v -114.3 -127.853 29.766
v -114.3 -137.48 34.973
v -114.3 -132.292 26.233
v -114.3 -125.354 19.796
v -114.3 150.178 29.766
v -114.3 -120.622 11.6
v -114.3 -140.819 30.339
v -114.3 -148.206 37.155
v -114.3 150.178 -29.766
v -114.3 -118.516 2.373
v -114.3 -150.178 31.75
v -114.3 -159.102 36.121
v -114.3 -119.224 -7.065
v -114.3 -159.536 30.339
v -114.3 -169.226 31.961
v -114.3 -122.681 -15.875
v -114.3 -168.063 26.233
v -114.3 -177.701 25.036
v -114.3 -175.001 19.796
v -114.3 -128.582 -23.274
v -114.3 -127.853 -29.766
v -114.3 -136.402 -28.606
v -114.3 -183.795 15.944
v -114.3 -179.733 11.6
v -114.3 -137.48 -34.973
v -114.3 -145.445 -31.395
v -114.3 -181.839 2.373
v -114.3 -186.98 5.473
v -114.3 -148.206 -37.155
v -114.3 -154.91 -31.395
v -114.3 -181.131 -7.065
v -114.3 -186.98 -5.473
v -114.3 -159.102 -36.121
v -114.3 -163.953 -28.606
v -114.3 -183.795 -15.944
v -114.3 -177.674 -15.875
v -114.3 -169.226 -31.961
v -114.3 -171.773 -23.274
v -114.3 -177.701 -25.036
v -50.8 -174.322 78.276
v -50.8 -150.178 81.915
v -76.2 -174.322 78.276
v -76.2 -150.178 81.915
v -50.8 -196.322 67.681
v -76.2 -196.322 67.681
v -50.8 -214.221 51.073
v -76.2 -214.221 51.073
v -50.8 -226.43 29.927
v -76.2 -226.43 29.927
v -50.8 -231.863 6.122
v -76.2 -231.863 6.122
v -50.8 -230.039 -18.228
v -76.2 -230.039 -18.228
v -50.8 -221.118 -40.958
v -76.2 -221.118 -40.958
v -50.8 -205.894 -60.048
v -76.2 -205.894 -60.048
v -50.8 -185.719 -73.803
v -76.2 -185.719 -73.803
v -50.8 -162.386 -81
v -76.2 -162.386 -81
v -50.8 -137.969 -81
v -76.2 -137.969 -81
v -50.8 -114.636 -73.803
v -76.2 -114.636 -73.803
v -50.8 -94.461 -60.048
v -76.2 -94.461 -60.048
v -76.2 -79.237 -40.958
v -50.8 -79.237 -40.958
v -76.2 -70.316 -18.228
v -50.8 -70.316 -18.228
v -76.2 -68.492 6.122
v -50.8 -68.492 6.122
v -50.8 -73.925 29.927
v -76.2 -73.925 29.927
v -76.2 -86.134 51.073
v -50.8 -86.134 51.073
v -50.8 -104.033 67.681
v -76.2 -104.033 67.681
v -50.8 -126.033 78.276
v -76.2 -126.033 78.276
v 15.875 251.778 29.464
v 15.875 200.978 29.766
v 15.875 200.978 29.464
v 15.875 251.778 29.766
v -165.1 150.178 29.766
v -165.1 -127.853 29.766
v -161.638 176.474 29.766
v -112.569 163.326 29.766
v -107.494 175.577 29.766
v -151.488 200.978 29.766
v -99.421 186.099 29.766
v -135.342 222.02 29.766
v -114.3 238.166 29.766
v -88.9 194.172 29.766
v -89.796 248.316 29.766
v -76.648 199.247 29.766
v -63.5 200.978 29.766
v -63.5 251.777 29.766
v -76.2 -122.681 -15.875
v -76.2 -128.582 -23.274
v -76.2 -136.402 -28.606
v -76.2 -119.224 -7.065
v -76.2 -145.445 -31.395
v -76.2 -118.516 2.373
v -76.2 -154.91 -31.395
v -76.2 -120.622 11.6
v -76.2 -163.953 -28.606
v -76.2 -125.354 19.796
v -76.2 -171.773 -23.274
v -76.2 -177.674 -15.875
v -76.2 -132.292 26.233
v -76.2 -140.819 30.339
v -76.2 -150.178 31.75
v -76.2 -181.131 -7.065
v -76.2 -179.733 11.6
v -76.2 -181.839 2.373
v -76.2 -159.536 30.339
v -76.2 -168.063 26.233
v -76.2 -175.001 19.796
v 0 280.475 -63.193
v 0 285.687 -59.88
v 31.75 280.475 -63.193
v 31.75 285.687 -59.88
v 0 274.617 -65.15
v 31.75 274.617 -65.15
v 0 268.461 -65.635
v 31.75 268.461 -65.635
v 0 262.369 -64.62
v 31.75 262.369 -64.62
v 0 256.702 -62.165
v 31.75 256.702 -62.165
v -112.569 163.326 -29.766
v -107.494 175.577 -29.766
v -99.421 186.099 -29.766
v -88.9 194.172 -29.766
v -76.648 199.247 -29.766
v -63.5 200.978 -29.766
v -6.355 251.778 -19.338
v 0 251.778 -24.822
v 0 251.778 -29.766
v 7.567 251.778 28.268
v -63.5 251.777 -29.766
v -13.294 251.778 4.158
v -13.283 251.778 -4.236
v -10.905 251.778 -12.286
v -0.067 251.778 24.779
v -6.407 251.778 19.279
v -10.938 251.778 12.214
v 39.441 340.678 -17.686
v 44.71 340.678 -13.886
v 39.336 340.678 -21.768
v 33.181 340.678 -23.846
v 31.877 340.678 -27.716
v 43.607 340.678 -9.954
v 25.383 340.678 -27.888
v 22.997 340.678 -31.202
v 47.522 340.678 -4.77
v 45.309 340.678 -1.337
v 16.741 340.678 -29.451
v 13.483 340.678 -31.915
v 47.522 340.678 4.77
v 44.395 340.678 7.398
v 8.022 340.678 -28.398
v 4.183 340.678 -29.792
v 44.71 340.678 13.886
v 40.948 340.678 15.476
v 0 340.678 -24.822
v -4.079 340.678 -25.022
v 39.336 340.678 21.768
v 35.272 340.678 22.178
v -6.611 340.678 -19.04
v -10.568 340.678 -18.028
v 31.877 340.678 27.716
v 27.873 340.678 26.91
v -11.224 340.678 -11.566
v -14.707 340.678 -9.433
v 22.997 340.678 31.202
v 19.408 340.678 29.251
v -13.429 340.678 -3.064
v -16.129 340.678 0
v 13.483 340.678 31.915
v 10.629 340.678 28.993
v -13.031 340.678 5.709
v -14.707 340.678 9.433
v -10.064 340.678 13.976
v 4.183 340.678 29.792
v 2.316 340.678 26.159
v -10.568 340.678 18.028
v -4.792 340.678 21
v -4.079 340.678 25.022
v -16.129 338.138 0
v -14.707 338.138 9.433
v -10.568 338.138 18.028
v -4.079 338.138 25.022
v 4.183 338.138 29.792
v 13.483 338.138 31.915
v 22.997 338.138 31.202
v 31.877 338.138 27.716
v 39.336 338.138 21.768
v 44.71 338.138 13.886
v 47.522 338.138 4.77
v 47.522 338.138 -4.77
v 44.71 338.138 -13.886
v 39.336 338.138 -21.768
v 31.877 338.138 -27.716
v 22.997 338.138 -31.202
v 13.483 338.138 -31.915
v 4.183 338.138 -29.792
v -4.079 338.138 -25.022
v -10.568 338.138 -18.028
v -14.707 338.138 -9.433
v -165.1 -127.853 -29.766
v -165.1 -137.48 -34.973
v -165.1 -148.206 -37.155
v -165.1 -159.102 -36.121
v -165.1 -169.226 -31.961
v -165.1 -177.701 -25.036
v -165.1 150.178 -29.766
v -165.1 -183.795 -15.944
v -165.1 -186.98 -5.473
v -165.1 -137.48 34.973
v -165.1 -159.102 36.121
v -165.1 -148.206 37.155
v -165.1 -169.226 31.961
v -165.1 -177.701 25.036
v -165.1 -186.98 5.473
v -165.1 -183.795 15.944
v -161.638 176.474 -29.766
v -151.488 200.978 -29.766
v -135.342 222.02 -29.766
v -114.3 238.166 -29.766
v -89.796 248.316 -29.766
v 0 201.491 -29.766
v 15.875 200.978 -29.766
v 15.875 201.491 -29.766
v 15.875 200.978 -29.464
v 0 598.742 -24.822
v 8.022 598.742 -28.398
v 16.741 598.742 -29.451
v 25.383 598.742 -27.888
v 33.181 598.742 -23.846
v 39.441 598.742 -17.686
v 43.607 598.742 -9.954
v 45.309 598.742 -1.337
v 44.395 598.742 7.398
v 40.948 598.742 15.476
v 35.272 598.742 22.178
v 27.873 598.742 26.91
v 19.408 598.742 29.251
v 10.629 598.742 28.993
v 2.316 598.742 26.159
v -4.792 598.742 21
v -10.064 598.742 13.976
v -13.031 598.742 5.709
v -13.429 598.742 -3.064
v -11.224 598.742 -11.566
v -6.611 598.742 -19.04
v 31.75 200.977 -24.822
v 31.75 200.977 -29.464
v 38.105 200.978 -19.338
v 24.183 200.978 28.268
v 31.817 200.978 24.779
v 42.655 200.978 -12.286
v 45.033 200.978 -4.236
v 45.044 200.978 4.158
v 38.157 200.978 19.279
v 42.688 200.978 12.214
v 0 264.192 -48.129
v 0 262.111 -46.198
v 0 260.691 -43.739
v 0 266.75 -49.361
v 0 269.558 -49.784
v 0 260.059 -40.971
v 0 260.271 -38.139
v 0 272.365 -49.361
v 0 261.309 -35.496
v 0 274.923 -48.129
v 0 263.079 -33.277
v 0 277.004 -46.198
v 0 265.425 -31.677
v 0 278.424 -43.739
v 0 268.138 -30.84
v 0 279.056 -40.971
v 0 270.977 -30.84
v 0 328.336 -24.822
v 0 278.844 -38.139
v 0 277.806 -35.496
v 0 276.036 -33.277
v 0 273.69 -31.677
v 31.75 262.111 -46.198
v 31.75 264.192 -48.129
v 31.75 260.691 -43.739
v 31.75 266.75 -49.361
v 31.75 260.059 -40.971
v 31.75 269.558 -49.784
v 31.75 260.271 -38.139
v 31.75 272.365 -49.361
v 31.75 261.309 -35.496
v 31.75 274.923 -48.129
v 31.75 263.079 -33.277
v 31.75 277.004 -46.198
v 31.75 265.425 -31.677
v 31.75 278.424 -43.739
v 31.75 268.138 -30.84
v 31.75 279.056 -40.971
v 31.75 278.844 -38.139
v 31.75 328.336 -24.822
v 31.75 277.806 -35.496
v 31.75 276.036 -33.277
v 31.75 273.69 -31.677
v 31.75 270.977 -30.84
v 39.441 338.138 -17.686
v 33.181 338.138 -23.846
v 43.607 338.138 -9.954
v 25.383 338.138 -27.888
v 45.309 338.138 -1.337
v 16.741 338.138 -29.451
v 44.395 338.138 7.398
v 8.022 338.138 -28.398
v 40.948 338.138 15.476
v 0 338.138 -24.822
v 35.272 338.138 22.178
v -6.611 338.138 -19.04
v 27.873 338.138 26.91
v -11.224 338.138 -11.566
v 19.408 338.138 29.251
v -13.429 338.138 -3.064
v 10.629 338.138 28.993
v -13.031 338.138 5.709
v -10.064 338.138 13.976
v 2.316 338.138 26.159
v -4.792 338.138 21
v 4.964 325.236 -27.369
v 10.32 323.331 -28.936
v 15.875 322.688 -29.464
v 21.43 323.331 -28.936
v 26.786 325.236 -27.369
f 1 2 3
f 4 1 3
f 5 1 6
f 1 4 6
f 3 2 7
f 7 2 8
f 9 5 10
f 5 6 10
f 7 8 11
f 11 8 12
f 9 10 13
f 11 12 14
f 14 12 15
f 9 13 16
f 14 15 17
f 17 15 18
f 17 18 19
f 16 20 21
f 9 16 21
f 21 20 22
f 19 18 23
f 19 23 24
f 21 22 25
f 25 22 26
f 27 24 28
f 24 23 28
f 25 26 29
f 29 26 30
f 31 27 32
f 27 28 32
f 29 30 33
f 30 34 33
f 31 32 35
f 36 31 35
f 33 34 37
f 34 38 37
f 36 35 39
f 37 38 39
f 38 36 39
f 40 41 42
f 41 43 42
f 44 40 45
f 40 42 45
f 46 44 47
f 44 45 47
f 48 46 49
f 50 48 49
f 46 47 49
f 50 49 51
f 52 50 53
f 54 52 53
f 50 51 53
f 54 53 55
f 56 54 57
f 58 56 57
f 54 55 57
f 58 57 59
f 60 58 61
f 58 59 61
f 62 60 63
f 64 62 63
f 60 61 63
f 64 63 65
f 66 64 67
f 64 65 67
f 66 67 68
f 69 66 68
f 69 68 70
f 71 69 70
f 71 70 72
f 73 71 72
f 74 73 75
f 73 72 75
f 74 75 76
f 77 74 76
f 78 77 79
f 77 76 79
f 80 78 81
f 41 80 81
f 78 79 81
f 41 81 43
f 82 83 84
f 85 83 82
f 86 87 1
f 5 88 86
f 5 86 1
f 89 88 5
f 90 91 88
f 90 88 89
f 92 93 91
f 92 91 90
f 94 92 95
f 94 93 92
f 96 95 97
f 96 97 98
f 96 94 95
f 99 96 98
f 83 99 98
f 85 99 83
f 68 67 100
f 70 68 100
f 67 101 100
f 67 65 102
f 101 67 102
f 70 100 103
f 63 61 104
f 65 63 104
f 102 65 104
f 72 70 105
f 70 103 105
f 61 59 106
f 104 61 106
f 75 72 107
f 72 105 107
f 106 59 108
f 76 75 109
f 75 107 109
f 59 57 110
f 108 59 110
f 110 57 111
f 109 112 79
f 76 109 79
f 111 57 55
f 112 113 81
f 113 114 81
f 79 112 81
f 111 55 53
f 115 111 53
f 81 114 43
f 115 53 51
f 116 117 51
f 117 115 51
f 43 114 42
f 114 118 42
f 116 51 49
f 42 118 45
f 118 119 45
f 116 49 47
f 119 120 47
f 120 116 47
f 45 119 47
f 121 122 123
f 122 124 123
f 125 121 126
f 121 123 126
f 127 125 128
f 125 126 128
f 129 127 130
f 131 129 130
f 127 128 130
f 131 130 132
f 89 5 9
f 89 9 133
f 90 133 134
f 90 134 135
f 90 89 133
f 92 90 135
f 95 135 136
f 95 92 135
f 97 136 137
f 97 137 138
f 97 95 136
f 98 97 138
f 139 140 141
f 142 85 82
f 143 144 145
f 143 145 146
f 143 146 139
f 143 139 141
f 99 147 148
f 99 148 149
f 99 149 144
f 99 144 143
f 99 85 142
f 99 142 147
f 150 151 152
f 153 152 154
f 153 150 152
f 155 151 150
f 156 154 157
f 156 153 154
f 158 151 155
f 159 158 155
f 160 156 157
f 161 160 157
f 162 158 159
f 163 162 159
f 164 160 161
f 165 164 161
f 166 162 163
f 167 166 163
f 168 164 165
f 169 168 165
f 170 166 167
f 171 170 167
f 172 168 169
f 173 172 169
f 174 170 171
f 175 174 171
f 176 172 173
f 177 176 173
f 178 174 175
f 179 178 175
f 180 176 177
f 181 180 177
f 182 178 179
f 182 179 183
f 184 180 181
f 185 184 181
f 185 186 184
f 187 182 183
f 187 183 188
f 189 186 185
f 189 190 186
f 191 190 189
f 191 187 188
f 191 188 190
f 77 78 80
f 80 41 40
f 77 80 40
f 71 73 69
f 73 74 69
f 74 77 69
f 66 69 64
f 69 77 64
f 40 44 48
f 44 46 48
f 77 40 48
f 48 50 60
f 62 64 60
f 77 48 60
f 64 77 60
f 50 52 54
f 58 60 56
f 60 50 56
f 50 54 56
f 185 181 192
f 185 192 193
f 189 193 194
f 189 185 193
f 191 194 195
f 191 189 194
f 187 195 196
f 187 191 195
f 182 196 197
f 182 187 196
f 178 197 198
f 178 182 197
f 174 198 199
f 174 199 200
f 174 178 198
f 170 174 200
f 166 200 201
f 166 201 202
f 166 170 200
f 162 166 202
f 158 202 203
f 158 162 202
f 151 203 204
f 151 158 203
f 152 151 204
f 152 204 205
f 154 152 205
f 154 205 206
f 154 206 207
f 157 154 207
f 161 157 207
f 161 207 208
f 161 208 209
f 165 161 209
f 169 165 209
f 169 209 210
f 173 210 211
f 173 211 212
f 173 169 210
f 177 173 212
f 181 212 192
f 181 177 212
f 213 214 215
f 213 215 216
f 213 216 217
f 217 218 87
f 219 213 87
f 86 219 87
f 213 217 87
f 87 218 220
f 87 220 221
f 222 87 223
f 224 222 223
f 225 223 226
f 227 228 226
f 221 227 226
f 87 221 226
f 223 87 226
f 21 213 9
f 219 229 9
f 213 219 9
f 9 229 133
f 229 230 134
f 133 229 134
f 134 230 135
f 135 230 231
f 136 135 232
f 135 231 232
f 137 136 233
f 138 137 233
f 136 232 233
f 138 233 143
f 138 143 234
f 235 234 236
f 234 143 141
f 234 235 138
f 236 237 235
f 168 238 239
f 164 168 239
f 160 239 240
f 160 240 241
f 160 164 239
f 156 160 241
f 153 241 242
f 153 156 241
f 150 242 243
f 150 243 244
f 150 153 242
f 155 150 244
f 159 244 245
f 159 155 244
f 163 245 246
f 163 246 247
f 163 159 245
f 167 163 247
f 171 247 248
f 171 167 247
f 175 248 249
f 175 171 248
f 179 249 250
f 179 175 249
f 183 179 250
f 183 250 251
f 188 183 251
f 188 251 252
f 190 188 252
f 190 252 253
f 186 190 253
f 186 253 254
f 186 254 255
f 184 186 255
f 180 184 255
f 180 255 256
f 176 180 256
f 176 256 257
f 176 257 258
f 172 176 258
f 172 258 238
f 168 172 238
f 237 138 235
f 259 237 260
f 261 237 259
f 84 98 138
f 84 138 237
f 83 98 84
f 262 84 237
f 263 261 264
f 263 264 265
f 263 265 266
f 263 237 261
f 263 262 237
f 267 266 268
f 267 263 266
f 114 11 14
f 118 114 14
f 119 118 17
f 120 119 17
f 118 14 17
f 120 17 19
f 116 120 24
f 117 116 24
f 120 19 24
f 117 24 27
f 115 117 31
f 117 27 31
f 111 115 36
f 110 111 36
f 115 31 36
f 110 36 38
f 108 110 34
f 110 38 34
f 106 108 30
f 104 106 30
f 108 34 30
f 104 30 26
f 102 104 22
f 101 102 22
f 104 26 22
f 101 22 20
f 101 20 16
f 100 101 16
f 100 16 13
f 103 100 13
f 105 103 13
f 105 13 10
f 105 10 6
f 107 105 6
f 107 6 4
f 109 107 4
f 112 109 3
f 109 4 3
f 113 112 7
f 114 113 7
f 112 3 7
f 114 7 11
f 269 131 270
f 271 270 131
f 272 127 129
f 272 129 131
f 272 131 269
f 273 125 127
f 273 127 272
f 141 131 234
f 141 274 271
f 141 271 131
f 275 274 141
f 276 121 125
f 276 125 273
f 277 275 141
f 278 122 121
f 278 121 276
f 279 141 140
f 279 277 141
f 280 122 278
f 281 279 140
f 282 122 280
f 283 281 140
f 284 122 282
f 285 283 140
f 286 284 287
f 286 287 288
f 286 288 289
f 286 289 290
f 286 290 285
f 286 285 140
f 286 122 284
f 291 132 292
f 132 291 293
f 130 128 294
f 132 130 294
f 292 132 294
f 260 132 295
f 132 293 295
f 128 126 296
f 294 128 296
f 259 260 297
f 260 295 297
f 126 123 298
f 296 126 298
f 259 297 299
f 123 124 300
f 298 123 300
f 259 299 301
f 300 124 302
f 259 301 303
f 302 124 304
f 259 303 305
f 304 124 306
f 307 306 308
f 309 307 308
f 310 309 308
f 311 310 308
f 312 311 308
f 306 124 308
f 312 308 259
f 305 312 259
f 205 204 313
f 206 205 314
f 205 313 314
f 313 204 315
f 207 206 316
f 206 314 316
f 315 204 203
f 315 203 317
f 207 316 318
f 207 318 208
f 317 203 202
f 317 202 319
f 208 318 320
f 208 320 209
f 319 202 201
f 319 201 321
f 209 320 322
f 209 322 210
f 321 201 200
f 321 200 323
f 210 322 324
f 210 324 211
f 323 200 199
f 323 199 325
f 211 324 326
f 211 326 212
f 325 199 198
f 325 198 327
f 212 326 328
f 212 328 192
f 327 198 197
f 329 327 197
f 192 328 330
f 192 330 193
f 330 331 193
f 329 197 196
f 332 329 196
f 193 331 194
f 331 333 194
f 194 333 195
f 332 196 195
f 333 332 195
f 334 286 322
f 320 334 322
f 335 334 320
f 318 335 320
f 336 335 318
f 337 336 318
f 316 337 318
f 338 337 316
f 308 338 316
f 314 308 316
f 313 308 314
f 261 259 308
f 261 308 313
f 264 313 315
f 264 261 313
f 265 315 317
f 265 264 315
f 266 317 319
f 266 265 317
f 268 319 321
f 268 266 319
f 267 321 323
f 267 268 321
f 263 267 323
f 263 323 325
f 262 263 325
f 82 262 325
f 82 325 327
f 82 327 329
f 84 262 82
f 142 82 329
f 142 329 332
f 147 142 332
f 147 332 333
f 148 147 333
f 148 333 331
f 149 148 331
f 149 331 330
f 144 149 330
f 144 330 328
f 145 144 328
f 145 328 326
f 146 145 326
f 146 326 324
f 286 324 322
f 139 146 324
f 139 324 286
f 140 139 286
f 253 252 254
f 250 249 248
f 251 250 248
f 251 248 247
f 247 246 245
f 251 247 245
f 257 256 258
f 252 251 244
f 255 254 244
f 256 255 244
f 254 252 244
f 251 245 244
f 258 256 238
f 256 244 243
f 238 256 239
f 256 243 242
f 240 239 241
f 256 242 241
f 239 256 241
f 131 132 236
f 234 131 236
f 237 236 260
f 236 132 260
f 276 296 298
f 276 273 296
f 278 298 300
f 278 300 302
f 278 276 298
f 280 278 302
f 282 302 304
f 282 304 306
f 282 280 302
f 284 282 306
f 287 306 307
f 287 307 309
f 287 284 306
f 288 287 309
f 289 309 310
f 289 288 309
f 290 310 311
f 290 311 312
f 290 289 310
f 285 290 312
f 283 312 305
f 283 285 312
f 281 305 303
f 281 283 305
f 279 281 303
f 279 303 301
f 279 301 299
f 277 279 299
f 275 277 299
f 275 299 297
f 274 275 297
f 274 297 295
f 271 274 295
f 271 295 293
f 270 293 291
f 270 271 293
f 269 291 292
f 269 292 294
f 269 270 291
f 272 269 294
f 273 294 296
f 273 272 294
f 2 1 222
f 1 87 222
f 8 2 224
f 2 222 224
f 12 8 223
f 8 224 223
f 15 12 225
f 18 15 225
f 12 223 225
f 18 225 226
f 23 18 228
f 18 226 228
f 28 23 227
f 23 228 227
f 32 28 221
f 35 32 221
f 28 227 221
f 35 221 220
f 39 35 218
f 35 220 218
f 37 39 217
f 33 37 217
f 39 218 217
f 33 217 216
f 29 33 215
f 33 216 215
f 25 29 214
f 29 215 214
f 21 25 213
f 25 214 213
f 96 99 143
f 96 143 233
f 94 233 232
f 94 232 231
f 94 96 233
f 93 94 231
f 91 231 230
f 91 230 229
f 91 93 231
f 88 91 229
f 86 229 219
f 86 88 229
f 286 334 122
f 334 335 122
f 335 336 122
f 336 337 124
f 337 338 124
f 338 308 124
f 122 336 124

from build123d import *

# Parameters (mm, degrees)
BOSS_EXTRUDE1_DEPTH = 29.765625
SKETCH3_R           = 29.464
OLEOPIST_DEPTH      = 397.764
SKETCH5_R           = 32.004
REFMAXOLEO_DEPTH    = 2.54
SKETCH7_R           = 9.525
BOSS_EXTRUDE4_DEPTH = 15.875


with BuildPart() as part:
    # Sketch1 → Boss-Extrude1 (new, symmetric)
    with BuildSketch(Plane.XY):
        with BuildLine():
            Line((-114.3, -150.1775), (-114.3, 150.1775))
            ThreePointArc((-114.3, 150.1775), (-99.421024484, 186.098524484), (-63.5, 200.9775))
            Line((-63.5, 200.9775), (15.875, 200.9775))
            Line((15.875, 200.9775), (15.875, 251.7775))
            Line((15.875, 251.7775), (-63.5, 251.7775))
            ThreePointArc((-63.5, 251.7775), (-135.342048969, 222.019548969), (-165.1, 150.1775))
            Line((-165.1, 150.1775), (-165.1, -150.1775))
            Line((-165.1, -150.1775), (-114.3, -150.1775))
        make_face()
    extrude(amount=BOSS_EXTRUDE1_DEPTH, both=True)

    # Sketch2 → Revolve1 (revolve)
    with BuildSketch(Plane.XZ.offset(150.1775)):
        Polygon((-165.1, 0), (-114.3, 0), (-50.8, 0), (-50.8, 81.915), (-76.2, 81.915), (-76.2, 31.75), (-114.3, 31.75), (-114.3, 37.20703125), (-165.1, 37.20703125), align=None)
    revolve(axis=Axis((-165.1, -150.1775, 0), (1, 0, 0)))

    # Sketch3 → OleoPist (add)
    with BuildSketch(Plane.XZ.offset(-200.9775)):
        with Locations(Location((15.875, 0, 0), (0, 0, 237.398482094))):
            Circle(SKETCH3_R)
    extrude(amount=-OLEOPIST_DEPTH)

    # Sketch5 → RefMaxOleo (add)
    with BuildSketch(Plane(origin=(0, 340.6775, 0), x_dir=(1, 0, 0), z_dir=(0, 1, 0))):
        with Locations(Location((15.875, 0, 0), (0, 0, 180))):
            Circle(SKETCH5_R)
    extrude(amount=-REFMAXOLEO_DEPTH)

    # Sketch7 → Boss-Extrude4 (add, symmetric)
    with BuildSketch(Plane(origin=(15.875, -150.1775, 0), x_dir=(0, 0, -1), z_dir=(1, 0, 0))):
        with BuildLine():
            Line((16.764, 488.315), (59.880363403, 435.864541166))
            ThreePointArc((59.880363403, 435.864541166), (65.58043358, 421.731246842), (62.165446707, 406.879355611))
            Line((62.165446707, 406.879355611), (29.464, 351.155))
            Line((29.464, 351.155), (16.764, 351.155))
            Line((16.764, 351.155), (16.764, 488.315))
        make_face()
        with Locations((40.259, 419.735)):
            Circle(SKETCH7_R, mode=Mode.SUBTRACT)
    extrude(amount=BOSS_EXTRUDE4_DEPTH, both=True)


solid = part.part
